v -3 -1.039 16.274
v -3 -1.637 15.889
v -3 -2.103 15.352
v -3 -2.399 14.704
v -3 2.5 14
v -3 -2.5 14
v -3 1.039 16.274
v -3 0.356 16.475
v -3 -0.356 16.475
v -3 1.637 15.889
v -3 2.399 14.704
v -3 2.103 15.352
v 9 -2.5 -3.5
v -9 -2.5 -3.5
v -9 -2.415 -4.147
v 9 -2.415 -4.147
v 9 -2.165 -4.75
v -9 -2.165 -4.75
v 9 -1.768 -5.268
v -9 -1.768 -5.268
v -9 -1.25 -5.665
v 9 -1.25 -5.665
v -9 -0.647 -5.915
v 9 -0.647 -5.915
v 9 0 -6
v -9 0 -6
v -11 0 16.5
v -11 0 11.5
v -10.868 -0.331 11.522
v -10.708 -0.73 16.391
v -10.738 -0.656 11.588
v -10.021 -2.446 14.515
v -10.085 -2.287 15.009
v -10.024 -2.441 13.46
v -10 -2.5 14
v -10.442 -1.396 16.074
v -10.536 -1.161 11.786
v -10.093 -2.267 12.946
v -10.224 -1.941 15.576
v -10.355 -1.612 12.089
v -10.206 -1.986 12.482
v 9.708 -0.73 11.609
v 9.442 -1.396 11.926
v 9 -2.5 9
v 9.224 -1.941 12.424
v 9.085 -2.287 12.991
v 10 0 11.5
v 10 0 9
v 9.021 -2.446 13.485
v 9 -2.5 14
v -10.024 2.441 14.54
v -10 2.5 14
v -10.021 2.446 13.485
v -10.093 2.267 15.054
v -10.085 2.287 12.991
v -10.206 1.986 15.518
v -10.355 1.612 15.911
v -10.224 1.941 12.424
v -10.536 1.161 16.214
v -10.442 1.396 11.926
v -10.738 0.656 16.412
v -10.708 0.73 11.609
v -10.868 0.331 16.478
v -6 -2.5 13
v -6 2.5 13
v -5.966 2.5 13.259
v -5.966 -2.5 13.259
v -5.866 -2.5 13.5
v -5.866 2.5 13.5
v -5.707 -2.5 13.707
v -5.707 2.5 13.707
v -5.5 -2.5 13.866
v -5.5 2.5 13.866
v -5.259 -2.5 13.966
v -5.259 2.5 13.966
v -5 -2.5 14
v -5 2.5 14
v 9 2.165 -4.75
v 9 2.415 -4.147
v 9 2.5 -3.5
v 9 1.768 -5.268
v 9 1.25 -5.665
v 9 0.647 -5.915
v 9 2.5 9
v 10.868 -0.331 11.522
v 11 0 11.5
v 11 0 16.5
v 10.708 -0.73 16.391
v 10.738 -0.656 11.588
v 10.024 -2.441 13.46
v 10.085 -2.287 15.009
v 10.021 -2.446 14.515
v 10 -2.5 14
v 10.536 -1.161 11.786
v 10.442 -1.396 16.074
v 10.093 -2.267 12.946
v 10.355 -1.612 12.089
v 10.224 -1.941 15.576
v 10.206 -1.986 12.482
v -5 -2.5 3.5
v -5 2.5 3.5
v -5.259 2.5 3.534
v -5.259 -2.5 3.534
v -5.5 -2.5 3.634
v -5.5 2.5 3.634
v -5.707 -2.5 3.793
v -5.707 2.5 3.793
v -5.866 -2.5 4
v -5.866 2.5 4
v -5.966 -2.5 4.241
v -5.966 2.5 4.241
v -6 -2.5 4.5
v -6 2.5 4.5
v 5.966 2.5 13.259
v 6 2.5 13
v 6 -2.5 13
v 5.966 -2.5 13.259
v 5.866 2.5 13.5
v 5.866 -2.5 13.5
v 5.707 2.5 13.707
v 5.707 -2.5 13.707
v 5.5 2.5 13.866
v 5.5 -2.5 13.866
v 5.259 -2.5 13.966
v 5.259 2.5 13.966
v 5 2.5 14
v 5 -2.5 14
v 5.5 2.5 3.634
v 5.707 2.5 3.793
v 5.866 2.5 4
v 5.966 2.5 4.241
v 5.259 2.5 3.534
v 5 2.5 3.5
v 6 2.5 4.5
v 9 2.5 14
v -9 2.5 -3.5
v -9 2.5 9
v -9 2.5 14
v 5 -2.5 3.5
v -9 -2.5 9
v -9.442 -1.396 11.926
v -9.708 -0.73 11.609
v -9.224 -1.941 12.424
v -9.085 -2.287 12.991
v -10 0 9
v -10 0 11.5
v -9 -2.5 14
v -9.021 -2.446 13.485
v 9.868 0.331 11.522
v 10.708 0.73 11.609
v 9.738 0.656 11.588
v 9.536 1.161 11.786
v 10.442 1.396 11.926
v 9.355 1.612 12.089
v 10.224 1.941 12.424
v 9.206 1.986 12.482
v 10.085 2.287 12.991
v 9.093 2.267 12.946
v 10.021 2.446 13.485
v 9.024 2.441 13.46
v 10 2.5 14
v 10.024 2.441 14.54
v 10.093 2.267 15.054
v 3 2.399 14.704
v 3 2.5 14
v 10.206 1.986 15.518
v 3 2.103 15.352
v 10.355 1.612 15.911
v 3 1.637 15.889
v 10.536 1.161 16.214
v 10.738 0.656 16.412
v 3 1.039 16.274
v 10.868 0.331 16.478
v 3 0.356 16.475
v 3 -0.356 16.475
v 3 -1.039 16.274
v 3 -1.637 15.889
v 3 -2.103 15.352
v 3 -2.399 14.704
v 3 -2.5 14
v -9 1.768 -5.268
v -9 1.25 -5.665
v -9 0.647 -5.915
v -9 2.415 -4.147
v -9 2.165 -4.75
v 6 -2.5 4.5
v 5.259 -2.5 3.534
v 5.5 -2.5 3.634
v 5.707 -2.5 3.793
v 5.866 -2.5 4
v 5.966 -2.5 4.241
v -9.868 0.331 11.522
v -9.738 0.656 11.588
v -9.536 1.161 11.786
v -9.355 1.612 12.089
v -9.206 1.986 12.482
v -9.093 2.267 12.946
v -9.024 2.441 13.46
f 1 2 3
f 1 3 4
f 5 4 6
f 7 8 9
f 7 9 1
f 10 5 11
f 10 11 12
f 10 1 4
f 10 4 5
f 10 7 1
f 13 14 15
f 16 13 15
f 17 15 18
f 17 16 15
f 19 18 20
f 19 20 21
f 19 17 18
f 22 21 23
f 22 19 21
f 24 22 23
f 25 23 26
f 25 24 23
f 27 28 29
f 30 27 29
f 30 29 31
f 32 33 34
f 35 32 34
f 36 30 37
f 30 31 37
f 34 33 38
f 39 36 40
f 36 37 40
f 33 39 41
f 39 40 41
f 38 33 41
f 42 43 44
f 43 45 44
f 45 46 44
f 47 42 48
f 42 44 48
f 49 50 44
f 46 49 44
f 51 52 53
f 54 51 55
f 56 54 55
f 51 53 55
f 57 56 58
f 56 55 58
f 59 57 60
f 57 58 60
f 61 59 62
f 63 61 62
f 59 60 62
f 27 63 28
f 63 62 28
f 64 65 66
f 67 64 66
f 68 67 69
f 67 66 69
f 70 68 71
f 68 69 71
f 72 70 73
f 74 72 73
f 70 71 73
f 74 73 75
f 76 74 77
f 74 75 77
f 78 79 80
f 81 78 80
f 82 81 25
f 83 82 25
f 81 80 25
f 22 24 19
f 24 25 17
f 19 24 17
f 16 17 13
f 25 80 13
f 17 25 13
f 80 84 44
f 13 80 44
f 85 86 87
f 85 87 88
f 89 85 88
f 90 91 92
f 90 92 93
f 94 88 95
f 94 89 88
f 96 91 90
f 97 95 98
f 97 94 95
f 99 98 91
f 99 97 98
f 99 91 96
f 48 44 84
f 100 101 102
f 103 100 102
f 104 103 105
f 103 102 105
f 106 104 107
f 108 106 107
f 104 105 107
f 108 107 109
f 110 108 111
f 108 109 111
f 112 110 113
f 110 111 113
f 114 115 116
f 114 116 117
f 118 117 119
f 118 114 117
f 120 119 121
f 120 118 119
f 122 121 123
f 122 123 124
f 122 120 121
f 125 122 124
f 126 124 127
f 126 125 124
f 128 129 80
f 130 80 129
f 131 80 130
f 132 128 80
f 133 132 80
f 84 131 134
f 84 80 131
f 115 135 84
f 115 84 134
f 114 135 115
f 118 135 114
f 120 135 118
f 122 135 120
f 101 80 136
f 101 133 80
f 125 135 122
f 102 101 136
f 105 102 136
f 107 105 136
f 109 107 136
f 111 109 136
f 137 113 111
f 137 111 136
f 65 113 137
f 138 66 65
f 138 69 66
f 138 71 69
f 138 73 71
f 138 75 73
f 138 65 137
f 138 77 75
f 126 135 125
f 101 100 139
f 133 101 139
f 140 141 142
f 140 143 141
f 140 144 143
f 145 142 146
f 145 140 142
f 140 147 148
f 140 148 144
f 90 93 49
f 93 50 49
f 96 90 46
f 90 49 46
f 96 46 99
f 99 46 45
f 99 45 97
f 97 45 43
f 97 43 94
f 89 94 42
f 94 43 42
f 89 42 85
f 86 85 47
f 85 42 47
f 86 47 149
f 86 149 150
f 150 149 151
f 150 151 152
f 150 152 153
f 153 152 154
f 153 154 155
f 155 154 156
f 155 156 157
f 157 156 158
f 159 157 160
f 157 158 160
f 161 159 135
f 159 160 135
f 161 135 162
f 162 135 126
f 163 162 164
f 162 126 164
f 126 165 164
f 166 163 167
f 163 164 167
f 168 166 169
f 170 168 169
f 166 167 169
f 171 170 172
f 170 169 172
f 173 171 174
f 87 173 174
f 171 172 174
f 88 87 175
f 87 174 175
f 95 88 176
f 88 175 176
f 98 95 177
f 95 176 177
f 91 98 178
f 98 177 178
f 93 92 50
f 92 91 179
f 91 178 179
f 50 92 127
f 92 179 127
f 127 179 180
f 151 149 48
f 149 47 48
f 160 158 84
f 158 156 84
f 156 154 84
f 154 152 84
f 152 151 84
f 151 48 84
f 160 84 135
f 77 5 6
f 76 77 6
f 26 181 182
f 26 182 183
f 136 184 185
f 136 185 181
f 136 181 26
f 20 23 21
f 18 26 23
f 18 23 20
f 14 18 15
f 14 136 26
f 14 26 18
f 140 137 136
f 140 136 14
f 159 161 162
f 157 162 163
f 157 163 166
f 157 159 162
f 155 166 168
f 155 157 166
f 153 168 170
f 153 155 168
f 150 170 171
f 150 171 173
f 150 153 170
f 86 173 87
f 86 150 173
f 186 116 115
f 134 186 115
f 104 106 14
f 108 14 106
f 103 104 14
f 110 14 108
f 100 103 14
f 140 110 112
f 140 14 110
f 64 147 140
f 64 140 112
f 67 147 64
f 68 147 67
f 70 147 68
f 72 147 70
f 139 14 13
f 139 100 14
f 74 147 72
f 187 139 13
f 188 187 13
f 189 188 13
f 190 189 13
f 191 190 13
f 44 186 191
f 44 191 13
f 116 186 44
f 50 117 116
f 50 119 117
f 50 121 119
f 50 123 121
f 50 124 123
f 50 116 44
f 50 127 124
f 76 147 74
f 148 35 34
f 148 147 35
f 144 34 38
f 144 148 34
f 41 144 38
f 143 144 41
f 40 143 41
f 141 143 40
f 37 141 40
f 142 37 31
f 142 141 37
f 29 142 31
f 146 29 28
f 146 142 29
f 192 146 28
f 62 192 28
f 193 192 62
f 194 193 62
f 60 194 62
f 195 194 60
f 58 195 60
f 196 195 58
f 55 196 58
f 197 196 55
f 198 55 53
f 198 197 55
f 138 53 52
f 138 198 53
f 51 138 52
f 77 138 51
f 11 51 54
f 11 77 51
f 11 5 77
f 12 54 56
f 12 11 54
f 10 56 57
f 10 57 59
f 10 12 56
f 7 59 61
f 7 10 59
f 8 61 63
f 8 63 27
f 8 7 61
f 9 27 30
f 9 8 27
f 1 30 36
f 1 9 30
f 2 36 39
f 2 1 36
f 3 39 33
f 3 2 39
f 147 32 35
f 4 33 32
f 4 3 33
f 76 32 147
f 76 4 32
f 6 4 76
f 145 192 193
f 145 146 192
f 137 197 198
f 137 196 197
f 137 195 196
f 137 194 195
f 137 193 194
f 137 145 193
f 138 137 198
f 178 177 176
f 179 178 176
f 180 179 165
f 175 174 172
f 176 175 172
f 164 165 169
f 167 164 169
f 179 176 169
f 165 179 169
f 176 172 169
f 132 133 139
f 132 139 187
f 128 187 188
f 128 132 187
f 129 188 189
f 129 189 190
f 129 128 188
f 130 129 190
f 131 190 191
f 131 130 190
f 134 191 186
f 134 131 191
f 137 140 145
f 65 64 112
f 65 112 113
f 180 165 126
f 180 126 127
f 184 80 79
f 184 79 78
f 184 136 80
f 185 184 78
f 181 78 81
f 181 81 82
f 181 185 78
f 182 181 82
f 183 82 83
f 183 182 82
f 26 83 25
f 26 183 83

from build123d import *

# Parameters (mm, degrees)
F2_DEPTH    = 2.5
F3_DEPTH    = 10
F4_DEPTH    = 3
F5_DEPTH    = 6
F6_T1_DEPTH = 5
F8_DEPTH    = 14
F9_DEPTH    = 9
F10_DEPTH   = 1
F11_DEPTH   = 16.5
F13_DEPTH   = 6
F14_R       = 2.49999


# Not quite as in the source:
# - a fillet or chamfer that OpenCascade refuses, or shapes differently, is made with other operations: its cross-section is extruded or revolved along the edge and cut away or added
# - a fillet or chamfer is up to 0.001 mm smaller than in the source, because OpenCascade refuses the exact size


with BuildPart() as f2:
    # F0 (on Front) → F2 (new body, symmetric)
    with BuildSketch(Plane.XZ):
        Polygon((0, 3.5), (0, 0), (9, 0), (9, 14), (6, 14), (6, 3.5), align=None)
    extrude(amount=F2_DEPTH, both=True)

    # F1 (on Right) → F3 (join)
    with BuildSketch(Plane.YZ):
        with BuildLine():
            Line((-2.5, 14), (2.5, 14))
            ThreePointArc((2.5, 14), (0, 16.5), (-2.5, 14))
        make_face()
        with BuildLine():
            ThreePointArc((-2.5, 14), (0, 11.5), (2.5, 14))
            Line((2.5, 14), (-2.5, 14))
        make_face()
    extrude(amount=F3_DEPTH)

    # F1 (on Right) → F4 (cut)
    with BuildSketch(Plane.YZ):
        with BuildLine():
            Line((-2.5, 14), (2.5, 14))
            ThreePointArc((2.5, 14), (0, 16.5), (-2.5, 14))
        make_face()
        with BuildLine():
            ThreePointArc((-2.5, 14), (0, 11.5), (2.5, 14))
            Line((2.5, 14), (-2.5, 14))
        make_face()
    extrude(amount=F4_DEPTH, mode=Mode.SUBTRACT)

    # F1 (on Right) → F5 (cut)
    with BuildSketch(Plane.YZ):
        with BuildLine():
            ThreePointArc((-2.5, 14), (0, 11.5), (2.5, 14))
            Line((2.5, 14), (-2.5, 14))
        make_face()
    extrude(amount=F5_DEPTH, mode=Mode.SUBTRACT)

    # F6: fillet of radius 1 on 2 edges, made by hand

    # F6_s2 → F6_t1 (join)
    with BuildSketch(Plane.XZ.offset(-2.5)):
        with BuildLine():
            ThreePointArc((6, 13), (5.7071067812, 13.7071067812), (5, 14))
            Line((5, 14), (6, 14))
            Line((6, 14), (6, 13))
        make_face()
        with BuildLine():
            ThreePointArc((5, 3.5), (5.7071067812, 3.7928932188), (6, 4.5))
            Line((6, 4.5), (6, 3.5))
            Line((6, 3.5), (5, 3.5))
        make_face()
    extrude(amount=F6_T1_DEPTH)

    # F7 (on Top) → F8 (join)
    with BuildSketch(Plane.XY):
        Polygon((9, 2.5), (9, -2.5), (10, 0), align=None)
    extrude(amount=F8_DEPTH)

    # F7 (on Top) → F9 (cut)
    with BuildSketch(Plane.XY):
        Polygon((9, 2.5), (9, -2.5), (10, 0), align=None)
    extrude(amount=F9_DEPTH, mode=Mode.SUBTRACT)

    # F10 (add): a face of the model
    f10_faces = [f2.faces().sort_by_distance(p)[0] for p in [
        (10, -1.717766953, 12.282233047),
    ]]
    extrude(f10_faces, amount=F10_DEPTH)

    # F7 (on Top) → F11 (cut)
    with BuildSketch(Plane.XY):
        Polygon((11, 0), (10, -2.5), (11.5, -2.5), (11.5, 2.5), (10, 2.5), align=None)
    extrude(amount=F11_DEPTH, mode=Mode.SUBTRACT)

    # F12: F2 across face


with BuildPart() as f2_1:
    add(f2.part)
    add(f2.part.mirror(Plane(origin=(0, 0, 1.75), x_dir=(0, -1, 0), z_dir=(-1, 0, 0))))

    # F13 (add): a face of the model
    f13_faces = [f2_1.faces().sort_by_distance(p)[0] for p in [
        (0, 0, 0),
    ]]
    extrude(f13_faces, amount=F13_DEPTH)

    # F14 (radius 2.5 in the source; OpenCascade refuses exactly that, so slightly less here)
    f14_edges = [f2_1.edges().sort_by_distance(p)[0] for p in [
        (0, -2.5, -6),
        (0, 2.5, -6),
    ]]
    fillet(f14_edges, radius=F14_R)


solid = f2_1.part
